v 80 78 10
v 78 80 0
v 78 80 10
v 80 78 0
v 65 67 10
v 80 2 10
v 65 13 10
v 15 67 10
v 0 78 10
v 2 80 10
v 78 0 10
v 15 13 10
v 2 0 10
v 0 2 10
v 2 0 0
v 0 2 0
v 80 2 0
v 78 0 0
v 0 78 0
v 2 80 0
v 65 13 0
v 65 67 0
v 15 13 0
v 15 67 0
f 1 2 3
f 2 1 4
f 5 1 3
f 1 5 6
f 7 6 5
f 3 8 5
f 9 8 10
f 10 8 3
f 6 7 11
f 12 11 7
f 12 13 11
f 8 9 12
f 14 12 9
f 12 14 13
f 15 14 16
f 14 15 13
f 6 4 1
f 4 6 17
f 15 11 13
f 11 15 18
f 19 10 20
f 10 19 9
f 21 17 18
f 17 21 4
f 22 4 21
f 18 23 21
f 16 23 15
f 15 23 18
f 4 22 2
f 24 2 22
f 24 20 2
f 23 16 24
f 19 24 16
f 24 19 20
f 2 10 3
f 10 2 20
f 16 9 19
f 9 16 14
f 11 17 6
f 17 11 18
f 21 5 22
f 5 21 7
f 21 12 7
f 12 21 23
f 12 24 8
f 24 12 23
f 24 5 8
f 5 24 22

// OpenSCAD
$fn = 32;

// ----------------------------------------------------------------------
// Windowed plate: 1 voids, 80 x 80 x 10 mm
// ----------------------------------------------------------------------

// --- parameters (mm) ---
plate_l = 80;             // plate length, X
plate_w = 80;             // plate width, Y
plate_t = 10;             // plate thickness, Z
edge_margin = 8;          // wall from the plate edge to any window
win1_l = 50;              // window length
win1_w = 54;              // window width
depth_1 = 10;             // depth of void 1 (full thickness = through)
corner_c = 2;             // corner chamfer of the plate

profile = [[2, 0], [78, 0], [80, 2], [80, 78], [78, 80], [2, 80], [0, 78], [0, 2]];  // primary outline, 8 points, counter clockwise
void_1 = [[15, 13], [65, 13], [65, 67], [15, 67]];  // large central window, 4 points

// --- the one profile operation ---
difference() {
  linear_extrude(height = plate_t) polygon(points = profile);
  translate([0, 0, -1])
    linear_extrude(height = plate_t + 2) polygon(points = void_1);
}
